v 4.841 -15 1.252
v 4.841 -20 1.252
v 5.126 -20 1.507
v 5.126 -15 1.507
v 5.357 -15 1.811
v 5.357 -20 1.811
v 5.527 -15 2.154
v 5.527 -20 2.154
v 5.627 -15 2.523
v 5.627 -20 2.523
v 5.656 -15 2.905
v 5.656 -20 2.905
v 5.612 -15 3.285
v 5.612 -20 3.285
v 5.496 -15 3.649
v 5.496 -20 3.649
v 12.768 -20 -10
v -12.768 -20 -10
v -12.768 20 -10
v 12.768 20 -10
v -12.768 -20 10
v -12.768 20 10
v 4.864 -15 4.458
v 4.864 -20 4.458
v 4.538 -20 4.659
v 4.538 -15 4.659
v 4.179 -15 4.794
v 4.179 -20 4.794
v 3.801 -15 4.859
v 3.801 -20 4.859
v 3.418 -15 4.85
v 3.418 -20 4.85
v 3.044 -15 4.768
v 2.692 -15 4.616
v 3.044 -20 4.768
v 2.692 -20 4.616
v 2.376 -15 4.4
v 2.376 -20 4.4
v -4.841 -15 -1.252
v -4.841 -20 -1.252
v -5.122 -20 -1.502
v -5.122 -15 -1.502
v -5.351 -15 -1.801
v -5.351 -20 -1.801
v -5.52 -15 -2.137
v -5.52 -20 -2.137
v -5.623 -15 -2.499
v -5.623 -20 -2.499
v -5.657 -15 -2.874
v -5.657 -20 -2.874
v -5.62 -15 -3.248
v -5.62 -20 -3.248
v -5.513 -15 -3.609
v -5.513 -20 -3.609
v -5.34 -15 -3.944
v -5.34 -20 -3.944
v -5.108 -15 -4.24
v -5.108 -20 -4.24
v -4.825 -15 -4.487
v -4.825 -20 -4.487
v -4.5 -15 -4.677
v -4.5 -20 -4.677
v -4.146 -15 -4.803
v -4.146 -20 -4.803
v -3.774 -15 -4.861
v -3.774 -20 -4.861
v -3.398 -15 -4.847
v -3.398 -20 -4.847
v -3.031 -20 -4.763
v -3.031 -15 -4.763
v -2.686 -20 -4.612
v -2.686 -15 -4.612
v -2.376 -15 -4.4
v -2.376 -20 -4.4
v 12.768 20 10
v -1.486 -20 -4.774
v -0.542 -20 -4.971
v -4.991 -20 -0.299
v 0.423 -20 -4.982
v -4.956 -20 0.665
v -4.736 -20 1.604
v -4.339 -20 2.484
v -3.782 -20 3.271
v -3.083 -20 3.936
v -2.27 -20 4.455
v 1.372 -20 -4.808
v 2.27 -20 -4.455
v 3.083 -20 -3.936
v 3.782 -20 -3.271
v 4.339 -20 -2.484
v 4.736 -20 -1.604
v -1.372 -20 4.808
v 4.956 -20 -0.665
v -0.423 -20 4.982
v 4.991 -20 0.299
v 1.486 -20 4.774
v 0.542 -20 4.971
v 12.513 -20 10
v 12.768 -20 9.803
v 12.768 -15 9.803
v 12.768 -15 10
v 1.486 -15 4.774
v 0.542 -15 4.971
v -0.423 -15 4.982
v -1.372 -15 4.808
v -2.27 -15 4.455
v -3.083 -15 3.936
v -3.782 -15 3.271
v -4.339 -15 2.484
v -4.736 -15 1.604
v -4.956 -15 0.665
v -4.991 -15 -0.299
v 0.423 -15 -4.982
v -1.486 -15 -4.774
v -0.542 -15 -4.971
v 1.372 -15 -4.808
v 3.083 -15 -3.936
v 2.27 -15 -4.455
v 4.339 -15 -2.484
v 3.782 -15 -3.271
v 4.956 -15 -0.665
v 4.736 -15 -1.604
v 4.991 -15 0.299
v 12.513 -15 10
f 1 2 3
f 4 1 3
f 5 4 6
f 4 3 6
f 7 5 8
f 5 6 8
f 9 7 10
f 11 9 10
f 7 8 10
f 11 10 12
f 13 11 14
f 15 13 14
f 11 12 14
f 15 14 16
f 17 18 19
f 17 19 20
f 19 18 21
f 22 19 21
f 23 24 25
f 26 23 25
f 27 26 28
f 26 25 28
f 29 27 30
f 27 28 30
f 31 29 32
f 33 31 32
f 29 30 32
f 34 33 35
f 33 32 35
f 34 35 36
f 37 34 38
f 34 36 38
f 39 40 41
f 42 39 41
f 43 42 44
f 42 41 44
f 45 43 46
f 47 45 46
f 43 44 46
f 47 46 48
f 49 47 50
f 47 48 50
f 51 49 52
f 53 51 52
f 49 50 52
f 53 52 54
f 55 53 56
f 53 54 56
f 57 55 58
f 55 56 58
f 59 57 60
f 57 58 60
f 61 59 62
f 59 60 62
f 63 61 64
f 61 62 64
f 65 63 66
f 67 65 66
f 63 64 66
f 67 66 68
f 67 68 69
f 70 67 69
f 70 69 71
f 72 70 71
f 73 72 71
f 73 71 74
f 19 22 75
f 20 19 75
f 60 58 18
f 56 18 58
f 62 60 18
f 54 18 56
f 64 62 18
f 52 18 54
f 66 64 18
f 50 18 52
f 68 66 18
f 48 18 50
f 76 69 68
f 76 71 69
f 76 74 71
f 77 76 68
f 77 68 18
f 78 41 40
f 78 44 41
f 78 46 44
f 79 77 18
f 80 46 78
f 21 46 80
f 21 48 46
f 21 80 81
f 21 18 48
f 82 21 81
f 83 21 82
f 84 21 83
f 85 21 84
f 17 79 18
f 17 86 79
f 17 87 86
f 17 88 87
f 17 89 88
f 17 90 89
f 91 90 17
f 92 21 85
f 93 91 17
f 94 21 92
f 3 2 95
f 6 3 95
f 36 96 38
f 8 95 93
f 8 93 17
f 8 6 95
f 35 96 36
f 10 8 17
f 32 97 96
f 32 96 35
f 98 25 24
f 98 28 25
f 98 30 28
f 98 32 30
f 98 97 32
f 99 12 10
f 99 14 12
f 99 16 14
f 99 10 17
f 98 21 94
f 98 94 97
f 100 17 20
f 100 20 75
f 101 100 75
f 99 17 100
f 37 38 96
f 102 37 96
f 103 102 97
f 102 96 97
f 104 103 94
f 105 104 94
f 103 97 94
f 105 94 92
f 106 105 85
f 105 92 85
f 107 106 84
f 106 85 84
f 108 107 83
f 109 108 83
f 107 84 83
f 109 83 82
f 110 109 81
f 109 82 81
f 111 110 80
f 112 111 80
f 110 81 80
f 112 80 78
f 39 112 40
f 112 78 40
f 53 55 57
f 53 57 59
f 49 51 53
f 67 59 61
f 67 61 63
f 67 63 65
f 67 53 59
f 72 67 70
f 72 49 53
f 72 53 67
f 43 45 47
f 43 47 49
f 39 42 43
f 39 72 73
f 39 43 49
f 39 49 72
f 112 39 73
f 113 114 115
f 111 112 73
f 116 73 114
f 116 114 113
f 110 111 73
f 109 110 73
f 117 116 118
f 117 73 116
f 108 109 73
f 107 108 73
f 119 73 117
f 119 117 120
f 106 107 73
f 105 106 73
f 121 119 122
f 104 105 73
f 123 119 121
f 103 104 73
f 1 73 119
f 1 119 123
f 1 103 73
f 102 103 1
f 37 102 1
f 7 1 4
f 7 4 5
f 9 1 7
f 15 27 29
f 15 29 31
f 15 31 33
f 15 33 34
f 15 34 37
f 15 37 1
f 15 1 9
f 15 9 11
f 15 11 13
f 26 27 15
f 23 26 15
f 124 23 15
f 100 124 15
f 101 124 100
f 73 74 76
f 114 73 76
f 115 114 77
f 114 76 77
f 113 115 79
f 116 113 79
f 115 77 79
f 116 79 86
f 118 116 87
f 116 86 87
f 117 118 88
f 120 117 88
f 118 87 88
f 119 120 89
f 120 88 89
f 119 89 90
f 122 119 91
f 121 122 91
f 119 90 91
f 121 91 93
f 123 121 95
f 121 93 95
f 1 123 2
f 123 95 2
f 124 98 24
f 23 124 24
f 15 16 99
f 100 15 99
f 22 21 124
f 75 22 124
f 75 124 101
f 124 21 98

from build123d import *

# Parameters (mm, degrees)
F0_W     = 25.536726
F0_H     = 20
F1_DEPTH = 20
F3_DEPTH = 5


with BuildPart() as f1:
    # F0 (on Front) → F1 (new body, symmetric)
    with BuildSketch(Plane.XZ):
        Rectangle(F0_W, F0_H)
    extrude(amount=F1_DEPTH, both=True)

    # F2 (on face) → F3 (cut)
    with BuildSketch(Plane.XZ.offset(20)):
        with BuildLine():
            ThreePointArc((4.863993, 4.458256), (3.609529, 4.863258), (2.375522, 4.399647))
            ThreePointArc((2.375522, 4.399647), (-3.082954, 3.936419), (-4.840709, -1.252014))
            ThreePointArc((-4.840709, -1.252014), (-5.231428, -4.09718), (-2.375531, -4.399642))
            ThreePointArc((-2.375531, -4.399642), (3.082946, -3.936425), (4.840711, 1.252004))
            ThreePointArc((4.840711, 1.252004), (5.585837, 2.336443), (5.495987, 3.649131))
            Line((5.495987, 3.649131), (14.416598, 11.198342))
            Line((14.416598, 11.198342), (14.321596, 11.310602))
            Line((14.321596, 11.310602), (4.863993, 4.458256))
        make_face()
    extrude(amount=-F3_DEPTH, mode=Mode.SUBTRACT)


solid = f1.part
